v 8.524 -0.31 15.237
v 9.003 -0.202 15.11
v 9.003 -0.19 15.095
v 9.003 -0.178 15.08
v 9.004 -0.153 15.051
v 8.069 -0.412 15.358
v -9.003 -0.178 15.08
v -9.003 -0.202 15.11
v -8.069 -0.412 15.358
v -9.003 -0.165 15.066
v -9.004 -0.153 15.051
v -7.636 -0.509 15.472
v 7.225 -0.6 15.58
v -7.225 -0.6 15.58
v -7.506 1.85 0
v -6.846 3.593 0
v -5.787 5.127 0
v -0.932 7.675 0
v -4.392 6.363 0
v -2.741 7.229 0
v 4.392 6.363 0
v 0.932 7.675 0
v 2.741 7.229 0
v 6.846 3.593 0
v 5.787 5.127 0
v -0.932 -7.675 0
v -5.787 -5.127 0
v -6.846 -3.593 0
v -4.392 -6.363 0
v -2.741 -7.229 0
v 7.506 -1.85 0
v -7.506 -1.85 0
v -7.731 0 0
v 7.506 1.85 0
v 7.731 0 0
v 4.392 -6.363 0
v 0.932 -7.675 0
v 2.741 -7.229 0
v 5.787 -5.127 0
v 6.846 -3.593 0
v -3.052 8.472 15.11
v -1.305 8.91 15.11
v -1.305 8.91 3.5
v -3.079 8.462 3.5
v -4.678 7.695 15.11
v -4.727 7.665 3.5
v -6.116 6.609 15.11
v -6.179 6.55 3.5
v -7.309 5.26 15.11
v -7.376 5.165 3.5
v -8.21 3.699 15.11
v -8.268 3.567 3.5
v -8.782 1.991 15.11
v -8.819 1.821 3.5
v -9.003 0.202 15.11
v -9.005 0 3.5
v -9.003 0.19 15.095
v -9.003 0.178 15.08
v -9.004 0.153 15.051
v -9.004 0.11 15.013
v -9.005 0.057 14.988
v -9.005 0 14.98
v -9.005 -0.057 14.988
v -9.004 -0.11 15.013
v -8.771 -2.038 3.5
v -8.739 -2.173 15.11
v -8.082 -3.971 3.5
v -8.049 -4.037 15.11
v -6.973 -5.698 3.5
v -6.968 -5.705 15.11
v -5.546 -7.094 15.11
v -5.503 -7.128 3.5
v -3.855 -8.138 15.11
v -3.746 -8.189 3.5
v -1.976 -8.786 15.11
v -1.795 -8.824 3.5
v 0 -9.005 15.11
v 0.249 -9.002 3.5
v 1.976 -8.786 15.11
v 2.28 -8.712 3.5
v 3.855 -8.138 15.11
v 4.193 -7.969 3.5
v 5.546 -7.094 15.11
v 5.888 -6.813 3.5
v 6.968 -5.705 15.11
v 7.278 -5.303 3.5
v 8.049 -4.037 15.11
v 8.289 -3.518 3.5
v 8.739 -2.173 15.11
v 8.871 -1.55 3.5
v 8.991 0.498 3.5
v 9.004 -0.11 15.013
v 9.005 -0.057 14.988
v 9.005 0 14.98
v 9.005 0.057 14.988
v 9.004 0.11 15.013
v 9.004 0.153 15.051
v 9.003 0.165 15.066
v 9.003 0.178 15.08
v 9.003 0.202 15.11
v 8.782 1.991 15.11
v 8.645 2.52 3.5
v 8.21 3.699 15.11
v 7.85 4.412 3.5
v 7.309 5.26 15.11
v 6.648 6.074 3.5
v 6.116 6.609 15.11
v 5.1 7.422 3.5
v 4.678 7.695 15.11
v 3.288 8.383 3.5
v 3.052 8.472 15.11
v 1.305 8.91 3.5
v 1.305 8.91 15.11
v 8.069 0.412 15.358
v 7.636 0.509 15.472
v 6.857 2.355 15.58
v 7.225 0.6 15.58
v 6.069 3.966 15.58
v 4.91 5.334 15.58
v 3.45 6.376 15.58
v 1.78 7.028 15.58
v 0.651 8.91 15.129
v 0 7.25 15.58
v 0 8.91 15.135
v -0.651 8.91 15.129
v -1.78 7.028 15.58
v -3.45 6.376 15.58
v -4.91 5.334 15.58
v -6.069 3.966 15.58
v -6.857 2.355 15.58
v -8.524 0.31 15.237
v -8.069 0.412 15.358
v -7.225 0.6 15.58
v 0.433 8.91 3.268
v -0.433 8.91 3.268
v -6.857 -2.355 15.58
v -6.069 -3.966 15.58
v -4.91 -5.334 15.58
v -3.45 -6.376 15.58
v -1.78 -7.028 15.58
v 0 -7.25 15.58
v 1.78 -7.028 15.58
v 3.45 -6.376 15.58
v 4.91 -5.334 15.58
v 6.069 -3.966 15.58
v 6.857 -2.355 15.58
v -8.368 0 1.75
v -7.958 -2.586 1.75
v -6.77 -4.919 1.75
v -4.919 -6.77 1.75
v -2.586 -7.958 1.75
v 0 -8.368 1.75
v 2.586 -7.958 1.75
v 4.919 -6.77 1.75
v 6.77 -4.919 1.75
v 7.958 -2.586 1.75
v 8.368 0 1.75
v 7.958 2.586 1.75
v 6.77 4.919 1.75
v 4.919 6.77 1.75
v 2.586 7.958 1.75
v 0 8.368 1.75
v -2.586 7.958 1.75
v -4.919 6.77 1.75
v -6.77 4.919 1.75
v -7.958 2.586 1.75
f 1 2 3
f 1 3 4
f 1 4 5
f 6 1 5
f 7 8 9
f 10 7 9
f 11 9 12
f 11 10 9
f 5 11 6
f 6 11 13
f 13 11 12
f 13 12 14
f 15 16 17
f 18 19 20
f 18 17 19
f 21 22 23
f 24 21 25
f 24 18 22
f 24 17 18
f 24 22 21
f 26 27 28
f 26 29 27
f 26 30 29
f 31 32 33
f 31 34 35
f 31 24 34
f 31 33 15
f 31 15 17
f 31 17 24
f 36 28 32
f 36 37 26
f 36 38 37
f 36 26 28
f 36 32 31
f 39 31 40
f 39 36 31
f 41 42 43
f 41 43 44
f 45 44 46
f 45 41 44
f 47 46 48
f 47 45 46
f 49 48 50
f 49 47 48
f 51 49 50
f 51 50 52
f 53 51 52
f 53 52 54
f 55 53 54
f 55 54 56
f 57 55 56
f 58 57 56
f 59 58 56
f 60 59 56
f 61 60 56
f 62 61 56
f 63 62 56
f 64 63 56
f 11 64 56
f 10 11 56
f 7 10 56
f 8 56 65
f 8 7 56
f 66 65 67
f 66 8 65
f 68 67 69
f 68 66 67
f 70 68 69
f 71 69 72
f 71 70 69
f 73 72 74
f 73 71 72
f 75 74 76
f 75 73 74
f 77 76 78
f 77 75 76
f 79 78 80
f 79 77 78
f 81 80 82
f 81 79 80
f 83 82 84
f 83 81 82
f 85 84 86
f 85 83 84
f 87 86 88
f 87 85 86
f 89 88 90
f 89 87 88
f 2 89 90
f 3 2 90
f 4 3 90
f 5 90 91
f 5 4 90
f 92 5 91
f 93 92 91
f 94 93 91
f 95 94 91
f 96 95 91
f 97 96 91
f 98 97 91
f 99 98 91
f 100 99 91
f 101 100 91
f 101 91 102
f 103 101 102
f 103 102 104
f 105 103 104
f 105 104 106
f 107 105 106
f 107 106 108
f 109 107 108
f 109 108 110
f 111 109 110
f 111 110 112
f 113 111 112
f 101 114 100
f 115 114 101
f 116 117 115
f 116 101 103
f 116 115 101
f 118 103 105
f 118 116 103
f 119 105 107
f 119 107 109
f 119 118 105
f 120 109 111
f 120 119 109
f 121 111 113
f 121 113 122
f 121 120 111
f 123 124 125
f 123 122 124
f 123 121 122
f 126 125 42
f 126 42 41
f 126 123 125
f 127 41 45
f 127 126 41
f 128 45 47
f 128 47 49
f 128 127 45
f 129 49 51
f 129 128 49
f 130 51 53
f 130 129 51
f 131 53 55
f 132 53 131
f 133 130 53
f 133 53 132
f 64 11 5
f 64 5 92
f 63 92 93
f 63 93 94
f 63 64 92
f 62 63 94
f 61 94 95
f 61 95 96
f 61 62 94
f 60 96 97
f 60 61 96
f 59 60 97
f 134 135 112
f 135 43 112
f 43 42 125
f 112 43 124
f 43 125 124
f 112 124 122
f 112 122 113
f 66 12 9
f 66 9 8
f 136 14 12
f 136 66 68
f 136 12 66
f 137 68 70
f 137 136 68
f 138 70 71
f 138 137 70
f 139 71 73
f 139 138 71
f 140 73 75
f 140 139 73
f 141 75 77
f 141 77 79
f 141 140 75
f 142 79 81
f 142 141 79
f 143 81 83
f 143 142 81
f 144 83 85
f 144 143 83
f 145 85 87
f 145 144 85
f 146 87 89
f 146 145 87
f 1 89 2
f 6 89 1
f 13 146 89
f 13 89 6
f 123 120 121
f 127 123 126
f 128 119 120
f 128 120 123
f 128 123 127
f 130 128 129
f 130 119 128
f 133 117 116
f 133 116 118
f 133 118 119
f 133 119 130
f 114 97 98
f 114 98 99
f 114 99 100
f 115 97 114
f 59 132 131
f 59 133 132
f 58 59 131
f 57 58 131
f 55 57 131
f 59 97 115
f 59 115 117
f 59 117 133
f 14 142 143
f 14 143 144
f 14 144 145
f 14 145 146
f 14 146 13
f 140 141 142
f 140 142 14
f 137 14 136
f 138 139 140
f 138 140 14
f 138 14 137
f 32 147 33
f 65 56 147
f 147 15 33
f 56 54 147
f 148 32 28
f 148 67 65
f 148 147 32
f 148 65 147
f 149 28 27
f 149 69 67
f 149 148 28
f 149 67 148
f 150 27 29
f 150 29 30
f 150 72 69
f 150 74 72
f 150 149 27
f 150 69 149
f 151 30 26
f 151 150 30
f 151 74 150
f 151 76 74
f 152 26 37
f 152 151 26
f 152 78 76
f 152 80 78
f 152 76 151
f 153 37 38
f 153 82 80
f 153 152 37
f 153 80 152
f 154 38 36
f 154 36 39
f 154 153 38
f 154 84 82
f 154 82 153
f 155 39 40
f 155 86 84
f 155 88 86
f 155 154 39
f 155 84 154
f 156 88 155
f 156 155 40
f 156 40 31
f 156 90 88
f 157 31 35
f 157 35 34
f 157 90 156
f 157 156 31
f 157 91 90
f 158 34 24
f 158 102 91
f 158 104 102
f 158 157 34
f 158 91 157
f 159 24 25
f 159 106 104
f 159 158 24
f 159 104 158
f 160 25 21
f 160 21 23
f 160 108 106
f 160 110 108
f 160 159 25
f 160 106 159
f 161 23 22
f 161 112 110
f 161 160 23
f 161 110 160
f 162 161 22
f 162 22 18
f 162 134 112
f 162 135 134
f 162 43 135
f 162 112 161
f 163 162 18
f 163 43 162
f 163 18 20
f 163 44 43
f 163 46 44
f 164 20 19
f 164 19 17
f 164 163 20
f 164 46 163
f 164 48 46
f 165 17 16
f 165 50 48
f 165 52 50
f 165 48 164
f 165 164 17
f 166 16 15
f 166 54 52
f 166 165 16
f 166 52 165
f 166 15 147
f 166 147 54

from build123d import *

# Parameters (mm, degrees)
EXTRUDE2_DEPTH      = 21.122535874
EXTRUDE2_DEPTH_BACK = 21.122535874
SKETCH3_W           = 7.52868736
SKETCH3_H           = 2
EXTRUDE3_DEPTH      = 21.122535963


with BuildPart() as part:
    # Sketch1 → Revolve1 (revolve)
    with BuildSketch(Plane(origin=(0, 0, 0), x_dir=(0, 0, -1), z_dir=(1, 0, 0)), mode=Mode.PRIVATE) as revolve1_sk:
        Polygon((0, 0), (0, 7.73110418), (-3.5, 9.005), (-15.109749167, 9.005), (-15.58, 7.25), (-15.58, 0), align=None)
    revolve(revolve1_sk.sketch.rotate(Axis((0, 0, 0), (0, 0, 1)), 90), axis=Axis((0, 0, 0), (0, 0, 1)))

    # Sketch2 → Extrude2 (cut, two sides: drawn at the far end of the back side and taken through both)
    with BuildSketch(Plane(origin=(0, 0, 0), x_dir=(0, -1, 0), z_dir=(1, 0, 0)).offset(-EXTRUDE2_DEPTH_BACK)):
        with BuildLine():
            Line((-0.152741588, -15.050887618), (-0.6, -15.58))
            Line((-0.6, -15.58), (0.6, -15.58))
            Line((0.6, -15.58), (0.152741588, -15.050887618))
            ThreePointArc((0.152741588, -15.050887618), (0, -14.98), (-0.152741588, -15.050887618))
        make_face()
    extrude(amount=EXTRUDE2_DEPTH + EXTRUDE2_DEPTH_BACK, mode=Mode.SUBTRACT)

    # Sketch3 → Extrude3 (cut, through all)
    with BuildSketch(Plane.XY.offset(15.58)):
        with Locations((0, 9.91)):
            Rectangle(SKETCH3_W, SKETCH3_H)
    extrude(amount=-EXTRUDE3_DEPTH, mode=Mode.SUBTRACT)


solid = part.part
